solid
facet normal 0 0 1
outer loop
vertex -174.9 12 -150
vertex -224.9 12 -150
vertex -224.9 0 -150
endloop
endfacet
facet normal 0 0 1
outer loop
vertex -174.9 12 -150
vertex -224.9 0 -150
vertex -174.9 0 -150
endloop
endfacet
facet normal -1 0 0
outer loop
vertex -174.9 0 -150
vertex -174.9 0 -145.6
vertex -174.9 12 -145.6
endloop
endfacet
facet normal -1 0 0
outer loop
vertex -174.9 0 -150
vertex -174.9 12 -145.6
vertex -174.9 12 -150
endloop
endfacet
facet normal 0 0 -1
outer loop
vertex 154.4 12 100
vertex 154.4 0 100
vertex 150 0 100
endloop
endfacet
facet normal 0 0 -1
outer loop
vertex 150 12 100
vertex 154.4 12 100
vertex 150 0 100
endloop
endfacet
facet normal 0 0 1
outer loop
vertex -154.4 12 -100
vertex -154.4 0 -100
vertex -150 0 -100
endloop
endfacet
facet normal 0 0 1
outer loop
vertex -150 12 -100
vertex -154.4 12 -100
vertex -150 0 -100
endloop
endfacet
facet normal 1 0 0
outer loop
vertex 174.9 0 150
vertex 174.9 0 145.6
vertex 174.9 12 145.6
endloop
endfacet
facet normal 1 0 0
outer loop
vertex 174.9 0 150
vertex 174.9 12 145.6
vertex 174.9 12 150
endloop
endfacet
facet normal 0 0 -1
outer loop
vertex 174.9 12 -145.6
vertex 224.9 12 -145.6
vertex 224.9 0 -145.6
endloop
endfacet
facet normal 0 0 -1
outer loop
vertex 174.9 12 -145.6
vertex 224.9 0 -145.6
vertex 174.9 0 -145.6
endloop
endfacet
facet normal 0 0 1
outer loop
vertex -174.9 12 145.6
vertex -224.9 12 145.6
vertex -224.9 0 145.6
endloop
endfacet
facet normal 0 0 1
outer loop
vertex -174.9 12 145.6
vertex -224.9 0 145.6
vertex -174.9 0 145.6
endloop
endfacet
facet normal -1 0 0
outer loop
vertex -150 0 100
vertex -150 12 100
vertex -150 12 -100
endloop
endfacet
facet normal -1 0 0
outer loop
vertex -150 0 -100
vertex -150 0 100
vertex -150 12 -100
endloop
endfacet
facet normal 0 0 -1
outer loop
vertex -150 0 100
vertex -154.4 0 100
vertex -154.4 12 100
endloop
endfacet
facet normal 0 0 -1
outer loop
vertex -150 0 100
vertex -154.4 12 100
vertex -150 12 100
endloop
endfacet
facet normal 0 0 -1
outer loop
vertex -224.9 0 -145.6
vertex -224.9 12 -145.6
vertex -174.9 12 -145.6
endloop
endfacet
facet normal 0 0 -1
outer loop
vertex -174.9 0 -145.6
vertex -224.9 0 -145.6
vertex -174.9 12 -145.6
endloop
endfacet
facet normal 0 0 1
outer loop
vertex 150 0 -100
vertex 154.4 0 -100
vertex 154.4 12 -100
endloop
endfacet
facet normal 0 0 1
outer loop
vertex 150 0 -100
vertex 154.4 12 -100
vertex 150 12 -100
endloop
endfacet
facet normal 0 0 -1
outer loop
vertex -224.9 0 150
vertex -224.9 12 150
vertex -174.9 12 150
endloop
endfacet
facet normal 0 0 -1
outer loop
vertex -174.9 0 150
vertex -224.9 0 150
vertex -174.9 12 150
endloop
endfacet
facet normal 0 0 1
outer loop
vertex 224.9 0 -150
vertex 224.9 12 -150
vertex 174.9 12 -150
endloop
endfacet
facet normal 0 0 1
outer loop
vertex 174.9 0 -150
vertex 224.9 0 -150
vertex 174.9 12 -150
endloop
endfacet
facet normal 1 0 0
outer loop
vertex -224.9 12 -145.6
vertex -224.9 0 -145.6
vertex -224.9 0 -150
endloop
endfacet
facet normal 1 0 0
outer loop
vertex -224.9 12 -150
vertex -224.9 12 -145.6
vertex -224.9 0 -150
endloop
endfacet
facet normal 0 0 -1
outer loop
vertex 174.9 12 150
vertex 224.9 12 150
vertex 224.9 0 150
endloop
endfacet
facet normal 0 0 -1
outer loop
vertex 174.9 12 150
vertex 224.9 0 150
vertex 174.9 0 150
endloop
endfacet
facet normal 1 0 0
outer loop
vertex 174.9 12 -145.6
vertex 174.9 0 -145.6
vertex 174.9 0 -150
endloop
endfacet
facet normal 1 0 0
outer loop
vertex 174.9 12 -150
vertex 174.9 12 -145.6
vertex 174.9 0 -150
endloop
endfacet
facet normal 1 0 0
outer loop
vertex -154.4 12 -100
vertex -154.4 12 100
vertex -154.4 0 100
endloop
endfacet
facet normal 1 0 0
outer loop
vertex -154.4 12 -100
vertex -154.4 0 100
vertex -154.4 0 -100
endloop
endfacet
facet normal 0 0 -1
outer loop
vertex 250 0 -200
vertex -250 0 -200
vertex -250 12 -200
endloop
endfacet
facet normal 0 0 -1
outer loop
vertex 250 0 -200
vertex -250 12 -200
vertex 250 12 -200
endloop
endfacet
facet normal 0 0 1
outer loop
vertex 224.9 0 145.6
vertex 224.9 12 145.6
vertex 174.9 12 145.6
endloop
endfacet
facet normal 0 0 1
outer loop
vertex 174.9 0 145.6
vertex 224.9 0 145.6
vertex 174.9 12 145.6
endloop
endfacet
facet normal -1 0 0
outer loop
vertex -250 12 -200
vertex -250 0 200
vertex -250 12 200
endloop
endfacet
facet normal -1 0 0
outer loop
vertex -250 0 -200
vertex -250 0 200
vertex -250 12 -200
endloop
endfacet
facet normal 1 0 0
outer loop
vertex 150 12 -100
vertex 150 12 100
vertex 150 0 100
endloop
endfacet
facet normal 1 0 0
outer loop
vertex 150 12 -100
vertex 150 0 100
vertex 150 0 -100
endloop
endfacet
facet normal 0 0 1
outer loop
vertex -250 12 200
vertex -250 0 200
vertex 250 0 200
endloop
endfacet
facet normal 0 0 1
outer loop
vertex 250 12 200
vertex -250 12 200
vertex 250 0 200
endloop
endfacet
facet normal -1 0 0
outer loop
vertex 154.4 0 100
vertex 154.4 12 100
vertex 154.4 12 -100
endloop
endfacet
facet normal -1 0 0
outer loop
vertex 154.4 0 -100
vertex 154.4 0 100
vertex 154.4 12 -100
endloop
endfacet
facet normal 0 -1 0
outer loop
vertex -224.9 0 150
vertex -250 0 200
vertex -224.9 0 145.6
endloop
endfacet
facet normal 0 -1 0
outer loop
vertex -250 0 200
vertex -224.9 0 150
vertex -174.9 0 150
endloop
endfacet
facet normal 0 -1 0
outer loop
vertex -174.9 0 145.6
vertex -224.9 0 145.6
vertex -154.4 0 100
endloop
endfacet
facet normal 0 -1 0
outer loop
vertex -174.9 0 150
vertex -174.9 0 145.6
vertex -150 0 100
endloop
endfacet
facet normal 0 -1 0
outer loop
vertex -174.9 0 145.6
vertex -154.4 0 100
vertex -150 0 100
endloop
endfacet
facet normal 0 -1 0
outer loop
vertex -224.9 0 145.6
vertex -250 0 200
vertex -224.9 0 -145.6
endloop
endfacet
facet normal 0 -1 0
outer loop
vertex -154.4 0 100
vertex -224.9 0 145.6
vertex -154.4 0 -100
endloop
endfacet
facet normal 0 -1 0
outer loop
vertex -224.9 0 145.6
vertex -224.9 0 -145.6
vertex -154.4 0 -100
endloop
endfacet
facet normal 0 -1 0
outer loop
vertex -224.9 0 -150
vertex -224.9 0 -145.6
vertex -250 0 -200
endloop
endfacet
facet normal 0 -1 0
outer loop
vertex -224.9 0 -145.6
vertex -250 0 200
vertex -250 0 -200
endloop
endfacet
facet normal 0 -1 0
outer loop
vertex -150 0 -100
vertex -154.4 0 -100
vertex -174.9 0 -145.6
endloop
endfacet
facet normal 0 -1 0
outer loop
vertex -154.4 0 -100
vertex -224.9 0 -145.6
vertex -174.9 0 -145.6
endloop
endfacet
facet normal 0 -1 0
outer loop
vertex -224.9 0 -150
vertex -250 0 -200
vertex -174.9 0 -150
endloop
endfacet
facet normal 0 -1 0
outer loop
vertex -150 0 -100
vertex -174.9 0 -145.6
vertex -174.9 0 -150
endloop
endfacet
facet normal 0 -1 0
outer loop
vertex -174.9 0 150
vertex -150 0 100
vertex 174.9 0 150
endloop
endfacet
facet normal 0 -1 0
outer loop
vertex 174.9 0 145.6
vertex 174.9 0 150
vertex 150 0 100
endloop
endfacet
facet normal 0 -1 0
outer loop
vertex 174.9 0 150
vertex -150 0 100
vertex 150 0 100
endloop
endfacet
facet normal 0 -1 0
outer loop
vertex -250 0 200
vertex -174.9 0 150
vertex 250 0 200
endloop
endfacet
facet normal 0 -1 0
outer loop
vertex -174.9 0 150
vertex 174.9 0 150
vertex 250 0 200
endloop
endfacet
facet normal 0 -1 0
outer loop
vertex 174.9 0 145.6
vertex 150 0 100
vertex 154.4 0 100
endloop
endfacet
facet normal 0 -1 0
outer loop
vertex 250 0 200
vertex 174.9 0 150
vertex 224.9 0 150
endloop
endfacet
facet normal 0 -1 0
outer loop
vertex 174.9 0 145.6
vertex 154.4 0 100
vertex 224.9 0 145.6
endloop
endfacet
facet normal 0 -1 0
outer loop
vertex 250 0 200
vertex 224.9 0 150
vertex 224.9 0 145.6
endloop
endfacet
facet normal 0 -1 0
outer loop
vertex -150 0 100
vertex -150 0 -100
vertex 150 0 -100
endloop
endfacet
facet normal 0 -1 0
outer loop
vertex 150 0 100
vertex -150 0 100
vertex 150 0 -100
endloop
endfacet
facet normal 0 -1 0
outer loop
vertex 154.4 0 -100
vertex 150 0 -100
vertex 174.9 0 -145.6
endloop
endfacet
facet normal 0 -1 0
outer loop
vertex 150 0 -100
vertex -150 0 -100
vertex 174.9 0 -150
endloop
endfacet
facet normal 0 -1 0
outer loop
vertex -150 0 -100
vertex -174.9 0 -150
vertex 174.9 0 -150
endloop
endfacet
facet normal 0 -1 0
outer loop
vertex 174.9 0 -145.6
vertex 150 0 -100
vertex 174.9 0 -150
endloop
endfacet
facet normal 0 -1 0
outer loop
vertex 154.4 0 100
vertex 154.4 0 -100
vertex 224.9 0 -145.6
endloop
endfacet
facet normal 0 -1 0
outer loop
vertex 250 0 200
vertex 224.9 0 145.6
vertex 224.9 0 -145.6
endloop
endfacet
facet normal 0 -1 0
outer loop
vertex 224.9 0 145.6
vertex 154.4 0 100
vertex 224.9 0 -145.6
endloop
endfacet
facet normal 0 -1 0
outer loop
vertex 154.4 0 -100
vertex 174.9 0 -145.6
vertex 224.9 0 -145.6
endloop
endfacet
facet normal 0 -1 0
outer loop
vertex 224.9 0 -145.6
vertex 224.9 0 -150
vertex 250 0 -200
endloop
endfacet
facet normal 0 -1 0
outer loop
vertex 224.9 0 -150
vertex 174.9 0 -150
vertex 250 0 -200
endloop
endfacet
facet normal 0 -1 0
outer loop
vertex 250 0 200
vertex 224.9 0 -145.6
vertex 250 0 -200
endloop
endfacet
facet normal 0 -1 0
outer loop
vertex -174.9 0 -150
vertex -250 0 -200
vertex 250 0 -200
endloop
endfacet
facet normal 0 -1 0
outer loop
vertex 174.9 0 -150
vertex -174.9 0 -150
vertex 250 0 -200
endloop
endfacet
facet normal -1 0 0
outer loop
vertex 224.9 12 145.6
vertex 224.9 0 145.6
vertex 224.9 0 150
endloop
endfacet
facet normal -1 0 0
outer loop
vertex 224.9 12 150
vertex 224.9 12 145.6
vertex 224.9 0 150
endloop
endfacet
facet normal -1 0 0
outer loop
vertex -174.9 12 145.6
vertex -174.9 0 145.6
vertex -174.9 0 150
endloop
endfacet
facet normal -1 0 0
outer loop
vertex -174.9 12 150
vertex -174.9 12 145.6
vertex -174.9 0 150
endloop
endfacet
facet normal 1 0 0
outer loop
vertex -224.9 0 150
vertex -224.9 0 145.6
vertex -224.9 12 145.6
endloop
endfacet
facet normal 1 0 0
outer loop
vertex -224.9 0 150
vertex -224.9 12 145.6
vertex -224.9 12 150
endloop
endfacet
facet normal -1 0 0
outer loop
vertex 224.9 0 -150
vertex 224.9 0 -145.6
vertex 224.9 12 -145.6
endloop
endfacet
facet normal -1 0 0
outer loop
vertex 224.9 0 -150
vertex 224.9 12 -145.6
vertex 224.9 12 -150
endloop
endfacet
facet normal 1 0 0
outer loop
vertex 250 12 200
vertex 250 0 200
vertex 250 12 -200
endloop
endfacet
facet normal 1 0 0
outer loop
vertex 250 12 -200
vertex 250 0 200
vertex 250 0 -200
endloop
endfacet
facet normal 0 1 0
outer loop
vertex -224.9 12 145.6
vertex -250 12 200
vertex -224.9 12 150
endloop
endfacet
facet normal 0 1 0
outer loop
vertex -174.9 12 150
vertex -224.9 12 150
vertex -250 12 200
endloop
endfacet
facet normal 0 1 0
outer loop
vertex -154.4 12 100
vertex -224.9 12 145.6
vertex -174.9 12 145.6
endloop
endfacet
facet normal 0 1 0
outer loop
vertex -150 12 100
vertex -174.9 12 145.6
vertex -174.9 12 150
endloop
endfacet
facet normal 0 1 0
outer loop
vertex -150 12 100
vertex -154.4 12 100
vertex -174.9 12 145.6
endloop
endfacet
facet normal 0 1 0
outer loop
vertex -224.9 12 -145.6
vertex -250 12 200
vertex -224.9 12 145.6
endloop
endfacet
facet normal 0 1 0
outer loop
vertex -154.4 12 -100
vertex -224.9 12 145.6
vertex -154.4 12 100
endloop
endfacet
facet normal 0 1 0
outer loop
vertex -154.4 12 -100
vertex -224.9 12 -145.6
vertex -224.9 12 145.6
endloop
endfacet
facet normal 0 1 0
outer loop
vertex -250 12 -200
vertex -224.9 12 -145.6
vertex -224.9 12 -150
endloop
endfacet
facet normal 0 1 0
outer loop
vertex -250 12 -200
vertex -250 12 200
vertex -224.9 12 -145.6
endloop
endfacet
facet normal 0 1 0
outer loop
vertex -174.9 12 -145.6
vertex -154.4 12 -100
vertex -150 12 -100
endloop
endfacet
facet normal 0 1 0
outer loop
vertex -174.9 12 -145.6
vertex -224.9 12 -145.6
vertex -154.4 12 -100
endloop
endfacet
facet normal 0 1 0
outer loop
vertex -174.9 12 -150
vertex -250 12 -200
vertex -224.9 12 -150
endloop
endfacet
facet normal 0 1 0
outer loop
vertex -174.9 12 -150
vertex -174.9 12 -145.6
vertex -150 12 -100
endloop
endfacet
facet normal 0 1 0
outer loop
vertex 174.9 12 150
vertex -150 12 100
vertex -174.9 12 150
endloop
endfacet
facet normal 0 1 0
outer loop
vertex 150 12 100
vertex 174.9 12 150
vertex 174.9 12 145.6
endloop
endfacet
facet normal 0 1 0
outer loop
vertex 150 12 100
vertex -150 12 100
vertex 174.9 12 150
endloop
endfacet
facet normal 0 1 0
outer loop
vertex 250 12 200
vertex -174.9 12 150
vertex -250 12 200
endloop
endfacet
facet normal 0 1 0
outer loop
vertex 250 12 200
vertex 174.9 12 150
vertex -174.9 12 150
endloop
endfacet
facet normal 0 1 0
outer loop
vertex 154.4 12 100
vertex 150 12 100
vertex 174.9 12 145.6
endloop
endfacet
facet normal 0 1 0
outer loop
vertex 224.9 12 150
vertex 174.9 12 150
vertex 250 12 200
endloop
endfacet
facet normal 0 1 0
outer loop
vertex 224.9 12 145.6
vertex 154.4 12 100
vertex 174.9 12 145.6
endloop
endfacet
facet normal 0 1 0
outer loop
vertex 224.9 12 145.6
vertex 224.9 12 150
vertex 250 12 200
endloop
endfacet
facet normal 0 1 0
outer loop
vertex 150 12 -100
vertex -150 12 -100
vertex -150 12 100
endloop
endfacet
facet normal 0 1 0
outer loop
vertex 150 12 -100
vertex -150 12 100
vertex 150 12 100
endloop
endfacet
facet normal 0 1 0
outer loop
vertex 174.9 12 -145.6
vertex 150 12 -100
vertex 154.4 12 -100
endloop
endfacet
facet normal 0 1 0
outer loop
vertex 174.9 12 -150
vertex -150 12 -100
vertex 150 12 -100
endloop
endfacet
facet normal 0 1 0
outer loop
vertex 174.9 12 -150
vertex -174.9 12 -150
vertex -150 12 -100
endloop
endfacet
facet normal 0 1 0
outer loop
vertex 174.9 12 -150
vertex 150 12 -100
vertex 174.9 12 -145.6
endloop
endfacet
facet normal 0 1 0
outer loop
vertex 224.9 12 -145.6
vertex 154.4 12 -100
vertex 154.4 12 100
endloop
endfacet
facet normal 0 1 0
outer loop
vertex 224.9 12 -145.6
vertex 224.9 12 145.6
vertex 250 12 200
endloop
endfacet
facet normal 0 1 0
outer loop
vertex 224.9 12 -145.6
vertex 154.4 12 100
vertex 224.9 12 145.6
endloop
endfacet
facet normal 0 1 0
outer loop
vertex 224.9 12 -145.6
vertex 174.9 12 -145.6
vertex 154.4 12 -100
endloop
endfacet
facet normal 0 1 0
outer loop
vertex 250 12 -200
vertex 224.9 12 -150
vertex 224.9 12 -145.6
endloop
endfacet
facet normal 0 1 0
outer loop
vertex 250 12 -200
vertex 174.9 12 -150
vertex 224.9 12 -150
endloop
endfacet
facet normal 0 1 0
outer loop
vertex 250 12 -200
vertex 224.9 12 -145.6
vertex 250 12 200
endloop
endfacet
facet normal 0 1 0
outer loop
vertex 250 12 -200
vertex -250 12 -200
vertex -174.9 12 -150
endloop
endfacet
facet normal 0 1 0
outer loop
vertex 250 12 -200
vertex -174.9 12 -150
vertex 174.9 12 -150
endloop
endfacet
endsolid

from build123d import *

# Parameters (mm, degrees)
SKETCH1_W                                  = 500
SKETCH1_H                                  = 400
BOSS_EXTRUDE1_DEPTH                        = 12
SKETCH2_W                                  = 4.4
SKETCH2_H                                  = 200
CUT_EXTRUDE1_DEPTH                         = 12
SKETCH5_W                                  = 50
SKETCH5_H                                  = 4.4
CUT_EXTRUDE2_DEPTH                         = 12
MIRROR5_AT_THE_SECOND_PLANE_COPY_1_SKETC_W = 50
MIRROR5_AT_THE_SECOND_PLANE_COPY_1_SKETC_H = 4.4
MIRROR5_AT_THE_SECOND_PLANE_COPY_1_DEPTH   = 12


with BuildPart() as part:
    # Sketch1 → Boss-Extrude1 (new body)
    with BuildSketch(Plane(origin=(0, 0, 0), x_dir=(1, 0, 0), z_dir=(0, 1, 0))):
        Rectangle(SKETCH1_W, SKETCH1_H)
    extrude(amount=BOSS_EXTRUDE1_DEPTH)

    # Sketch2 → Cut-Extrude1 (cut)
    with BuildSketch(Plane(origin=(0, 12, 0), x_dir=(1, 0, 0), z_dir=(0, 1, 0))):
        with Locations((-152.2, 0)):
            Rectangle(SKETCH2_W, SKETCH2_H)
    cut_extrude1 = extrude(amount=-CUT_EXTRUDE1_DEPTH, mode=Mode.SUBTRACT)

    # Mirror2: Cut-Extrude1 across plane
    add(cut_extrude1.mirror(Plane(origin=(0, 0, 0), x_dir=(0, 0, 1), z_dir=(1, 0, 0))), mode=Mode.SUBTRACT)

    # Sketch5 → Cut-Extrude2 (cut)
    with BuildSketch(Plane(origin=(0, 12, 0), x_dir=(1, 0, 0), z_dir=(0, 1, 0))):
        with Locations((-199.9, 147.8)):
            Rectangle(SKETCH5_W, SKETCH5_H)
    cut_extrude2 = extrude(amount=-CUT_EXTRUDE2_DEPTH, mode=Mode.SUBTRACT)

    # Mirror5: Cut-Extrude2 across plane
    add(cut_extrude2.mirror(Plane.XY), mode=Mode.SUBTRACT)

    # Mirror5 at the second plane: Cut-Extrude2 across plane
    add(cut_extrude2.mirror(Plane(origin=(0, 0, 0), x_dir=(0, 0, 1), z_dir=(1, 0, 0))), mode=Mode.SUBTRACT)

    # Mirror5 at the second plane copy 1 sketc → Mirror5 at the second plane copy 1 (cut)
    with BuildSketch(Plane(origin=(0, 12, 0), x_dir=(-1, 0, 0), z_dir=(0, 1, 0))):
        with Locations((-199.9, 147.8)):
            Rectangle(MIRROR5_AT_THE_SECOND_PLANE_COPY_1_SKETC_W, MIRROR5_AT_THE_SECOND_PLANE_COPY_1_SKETC_H)
    extrude(amount=-MIRROR5_AT_THE_SECOND_PLANE_COPY_1_DEPTH, mode=Mode.SUBTRACT)


solid = part.part
